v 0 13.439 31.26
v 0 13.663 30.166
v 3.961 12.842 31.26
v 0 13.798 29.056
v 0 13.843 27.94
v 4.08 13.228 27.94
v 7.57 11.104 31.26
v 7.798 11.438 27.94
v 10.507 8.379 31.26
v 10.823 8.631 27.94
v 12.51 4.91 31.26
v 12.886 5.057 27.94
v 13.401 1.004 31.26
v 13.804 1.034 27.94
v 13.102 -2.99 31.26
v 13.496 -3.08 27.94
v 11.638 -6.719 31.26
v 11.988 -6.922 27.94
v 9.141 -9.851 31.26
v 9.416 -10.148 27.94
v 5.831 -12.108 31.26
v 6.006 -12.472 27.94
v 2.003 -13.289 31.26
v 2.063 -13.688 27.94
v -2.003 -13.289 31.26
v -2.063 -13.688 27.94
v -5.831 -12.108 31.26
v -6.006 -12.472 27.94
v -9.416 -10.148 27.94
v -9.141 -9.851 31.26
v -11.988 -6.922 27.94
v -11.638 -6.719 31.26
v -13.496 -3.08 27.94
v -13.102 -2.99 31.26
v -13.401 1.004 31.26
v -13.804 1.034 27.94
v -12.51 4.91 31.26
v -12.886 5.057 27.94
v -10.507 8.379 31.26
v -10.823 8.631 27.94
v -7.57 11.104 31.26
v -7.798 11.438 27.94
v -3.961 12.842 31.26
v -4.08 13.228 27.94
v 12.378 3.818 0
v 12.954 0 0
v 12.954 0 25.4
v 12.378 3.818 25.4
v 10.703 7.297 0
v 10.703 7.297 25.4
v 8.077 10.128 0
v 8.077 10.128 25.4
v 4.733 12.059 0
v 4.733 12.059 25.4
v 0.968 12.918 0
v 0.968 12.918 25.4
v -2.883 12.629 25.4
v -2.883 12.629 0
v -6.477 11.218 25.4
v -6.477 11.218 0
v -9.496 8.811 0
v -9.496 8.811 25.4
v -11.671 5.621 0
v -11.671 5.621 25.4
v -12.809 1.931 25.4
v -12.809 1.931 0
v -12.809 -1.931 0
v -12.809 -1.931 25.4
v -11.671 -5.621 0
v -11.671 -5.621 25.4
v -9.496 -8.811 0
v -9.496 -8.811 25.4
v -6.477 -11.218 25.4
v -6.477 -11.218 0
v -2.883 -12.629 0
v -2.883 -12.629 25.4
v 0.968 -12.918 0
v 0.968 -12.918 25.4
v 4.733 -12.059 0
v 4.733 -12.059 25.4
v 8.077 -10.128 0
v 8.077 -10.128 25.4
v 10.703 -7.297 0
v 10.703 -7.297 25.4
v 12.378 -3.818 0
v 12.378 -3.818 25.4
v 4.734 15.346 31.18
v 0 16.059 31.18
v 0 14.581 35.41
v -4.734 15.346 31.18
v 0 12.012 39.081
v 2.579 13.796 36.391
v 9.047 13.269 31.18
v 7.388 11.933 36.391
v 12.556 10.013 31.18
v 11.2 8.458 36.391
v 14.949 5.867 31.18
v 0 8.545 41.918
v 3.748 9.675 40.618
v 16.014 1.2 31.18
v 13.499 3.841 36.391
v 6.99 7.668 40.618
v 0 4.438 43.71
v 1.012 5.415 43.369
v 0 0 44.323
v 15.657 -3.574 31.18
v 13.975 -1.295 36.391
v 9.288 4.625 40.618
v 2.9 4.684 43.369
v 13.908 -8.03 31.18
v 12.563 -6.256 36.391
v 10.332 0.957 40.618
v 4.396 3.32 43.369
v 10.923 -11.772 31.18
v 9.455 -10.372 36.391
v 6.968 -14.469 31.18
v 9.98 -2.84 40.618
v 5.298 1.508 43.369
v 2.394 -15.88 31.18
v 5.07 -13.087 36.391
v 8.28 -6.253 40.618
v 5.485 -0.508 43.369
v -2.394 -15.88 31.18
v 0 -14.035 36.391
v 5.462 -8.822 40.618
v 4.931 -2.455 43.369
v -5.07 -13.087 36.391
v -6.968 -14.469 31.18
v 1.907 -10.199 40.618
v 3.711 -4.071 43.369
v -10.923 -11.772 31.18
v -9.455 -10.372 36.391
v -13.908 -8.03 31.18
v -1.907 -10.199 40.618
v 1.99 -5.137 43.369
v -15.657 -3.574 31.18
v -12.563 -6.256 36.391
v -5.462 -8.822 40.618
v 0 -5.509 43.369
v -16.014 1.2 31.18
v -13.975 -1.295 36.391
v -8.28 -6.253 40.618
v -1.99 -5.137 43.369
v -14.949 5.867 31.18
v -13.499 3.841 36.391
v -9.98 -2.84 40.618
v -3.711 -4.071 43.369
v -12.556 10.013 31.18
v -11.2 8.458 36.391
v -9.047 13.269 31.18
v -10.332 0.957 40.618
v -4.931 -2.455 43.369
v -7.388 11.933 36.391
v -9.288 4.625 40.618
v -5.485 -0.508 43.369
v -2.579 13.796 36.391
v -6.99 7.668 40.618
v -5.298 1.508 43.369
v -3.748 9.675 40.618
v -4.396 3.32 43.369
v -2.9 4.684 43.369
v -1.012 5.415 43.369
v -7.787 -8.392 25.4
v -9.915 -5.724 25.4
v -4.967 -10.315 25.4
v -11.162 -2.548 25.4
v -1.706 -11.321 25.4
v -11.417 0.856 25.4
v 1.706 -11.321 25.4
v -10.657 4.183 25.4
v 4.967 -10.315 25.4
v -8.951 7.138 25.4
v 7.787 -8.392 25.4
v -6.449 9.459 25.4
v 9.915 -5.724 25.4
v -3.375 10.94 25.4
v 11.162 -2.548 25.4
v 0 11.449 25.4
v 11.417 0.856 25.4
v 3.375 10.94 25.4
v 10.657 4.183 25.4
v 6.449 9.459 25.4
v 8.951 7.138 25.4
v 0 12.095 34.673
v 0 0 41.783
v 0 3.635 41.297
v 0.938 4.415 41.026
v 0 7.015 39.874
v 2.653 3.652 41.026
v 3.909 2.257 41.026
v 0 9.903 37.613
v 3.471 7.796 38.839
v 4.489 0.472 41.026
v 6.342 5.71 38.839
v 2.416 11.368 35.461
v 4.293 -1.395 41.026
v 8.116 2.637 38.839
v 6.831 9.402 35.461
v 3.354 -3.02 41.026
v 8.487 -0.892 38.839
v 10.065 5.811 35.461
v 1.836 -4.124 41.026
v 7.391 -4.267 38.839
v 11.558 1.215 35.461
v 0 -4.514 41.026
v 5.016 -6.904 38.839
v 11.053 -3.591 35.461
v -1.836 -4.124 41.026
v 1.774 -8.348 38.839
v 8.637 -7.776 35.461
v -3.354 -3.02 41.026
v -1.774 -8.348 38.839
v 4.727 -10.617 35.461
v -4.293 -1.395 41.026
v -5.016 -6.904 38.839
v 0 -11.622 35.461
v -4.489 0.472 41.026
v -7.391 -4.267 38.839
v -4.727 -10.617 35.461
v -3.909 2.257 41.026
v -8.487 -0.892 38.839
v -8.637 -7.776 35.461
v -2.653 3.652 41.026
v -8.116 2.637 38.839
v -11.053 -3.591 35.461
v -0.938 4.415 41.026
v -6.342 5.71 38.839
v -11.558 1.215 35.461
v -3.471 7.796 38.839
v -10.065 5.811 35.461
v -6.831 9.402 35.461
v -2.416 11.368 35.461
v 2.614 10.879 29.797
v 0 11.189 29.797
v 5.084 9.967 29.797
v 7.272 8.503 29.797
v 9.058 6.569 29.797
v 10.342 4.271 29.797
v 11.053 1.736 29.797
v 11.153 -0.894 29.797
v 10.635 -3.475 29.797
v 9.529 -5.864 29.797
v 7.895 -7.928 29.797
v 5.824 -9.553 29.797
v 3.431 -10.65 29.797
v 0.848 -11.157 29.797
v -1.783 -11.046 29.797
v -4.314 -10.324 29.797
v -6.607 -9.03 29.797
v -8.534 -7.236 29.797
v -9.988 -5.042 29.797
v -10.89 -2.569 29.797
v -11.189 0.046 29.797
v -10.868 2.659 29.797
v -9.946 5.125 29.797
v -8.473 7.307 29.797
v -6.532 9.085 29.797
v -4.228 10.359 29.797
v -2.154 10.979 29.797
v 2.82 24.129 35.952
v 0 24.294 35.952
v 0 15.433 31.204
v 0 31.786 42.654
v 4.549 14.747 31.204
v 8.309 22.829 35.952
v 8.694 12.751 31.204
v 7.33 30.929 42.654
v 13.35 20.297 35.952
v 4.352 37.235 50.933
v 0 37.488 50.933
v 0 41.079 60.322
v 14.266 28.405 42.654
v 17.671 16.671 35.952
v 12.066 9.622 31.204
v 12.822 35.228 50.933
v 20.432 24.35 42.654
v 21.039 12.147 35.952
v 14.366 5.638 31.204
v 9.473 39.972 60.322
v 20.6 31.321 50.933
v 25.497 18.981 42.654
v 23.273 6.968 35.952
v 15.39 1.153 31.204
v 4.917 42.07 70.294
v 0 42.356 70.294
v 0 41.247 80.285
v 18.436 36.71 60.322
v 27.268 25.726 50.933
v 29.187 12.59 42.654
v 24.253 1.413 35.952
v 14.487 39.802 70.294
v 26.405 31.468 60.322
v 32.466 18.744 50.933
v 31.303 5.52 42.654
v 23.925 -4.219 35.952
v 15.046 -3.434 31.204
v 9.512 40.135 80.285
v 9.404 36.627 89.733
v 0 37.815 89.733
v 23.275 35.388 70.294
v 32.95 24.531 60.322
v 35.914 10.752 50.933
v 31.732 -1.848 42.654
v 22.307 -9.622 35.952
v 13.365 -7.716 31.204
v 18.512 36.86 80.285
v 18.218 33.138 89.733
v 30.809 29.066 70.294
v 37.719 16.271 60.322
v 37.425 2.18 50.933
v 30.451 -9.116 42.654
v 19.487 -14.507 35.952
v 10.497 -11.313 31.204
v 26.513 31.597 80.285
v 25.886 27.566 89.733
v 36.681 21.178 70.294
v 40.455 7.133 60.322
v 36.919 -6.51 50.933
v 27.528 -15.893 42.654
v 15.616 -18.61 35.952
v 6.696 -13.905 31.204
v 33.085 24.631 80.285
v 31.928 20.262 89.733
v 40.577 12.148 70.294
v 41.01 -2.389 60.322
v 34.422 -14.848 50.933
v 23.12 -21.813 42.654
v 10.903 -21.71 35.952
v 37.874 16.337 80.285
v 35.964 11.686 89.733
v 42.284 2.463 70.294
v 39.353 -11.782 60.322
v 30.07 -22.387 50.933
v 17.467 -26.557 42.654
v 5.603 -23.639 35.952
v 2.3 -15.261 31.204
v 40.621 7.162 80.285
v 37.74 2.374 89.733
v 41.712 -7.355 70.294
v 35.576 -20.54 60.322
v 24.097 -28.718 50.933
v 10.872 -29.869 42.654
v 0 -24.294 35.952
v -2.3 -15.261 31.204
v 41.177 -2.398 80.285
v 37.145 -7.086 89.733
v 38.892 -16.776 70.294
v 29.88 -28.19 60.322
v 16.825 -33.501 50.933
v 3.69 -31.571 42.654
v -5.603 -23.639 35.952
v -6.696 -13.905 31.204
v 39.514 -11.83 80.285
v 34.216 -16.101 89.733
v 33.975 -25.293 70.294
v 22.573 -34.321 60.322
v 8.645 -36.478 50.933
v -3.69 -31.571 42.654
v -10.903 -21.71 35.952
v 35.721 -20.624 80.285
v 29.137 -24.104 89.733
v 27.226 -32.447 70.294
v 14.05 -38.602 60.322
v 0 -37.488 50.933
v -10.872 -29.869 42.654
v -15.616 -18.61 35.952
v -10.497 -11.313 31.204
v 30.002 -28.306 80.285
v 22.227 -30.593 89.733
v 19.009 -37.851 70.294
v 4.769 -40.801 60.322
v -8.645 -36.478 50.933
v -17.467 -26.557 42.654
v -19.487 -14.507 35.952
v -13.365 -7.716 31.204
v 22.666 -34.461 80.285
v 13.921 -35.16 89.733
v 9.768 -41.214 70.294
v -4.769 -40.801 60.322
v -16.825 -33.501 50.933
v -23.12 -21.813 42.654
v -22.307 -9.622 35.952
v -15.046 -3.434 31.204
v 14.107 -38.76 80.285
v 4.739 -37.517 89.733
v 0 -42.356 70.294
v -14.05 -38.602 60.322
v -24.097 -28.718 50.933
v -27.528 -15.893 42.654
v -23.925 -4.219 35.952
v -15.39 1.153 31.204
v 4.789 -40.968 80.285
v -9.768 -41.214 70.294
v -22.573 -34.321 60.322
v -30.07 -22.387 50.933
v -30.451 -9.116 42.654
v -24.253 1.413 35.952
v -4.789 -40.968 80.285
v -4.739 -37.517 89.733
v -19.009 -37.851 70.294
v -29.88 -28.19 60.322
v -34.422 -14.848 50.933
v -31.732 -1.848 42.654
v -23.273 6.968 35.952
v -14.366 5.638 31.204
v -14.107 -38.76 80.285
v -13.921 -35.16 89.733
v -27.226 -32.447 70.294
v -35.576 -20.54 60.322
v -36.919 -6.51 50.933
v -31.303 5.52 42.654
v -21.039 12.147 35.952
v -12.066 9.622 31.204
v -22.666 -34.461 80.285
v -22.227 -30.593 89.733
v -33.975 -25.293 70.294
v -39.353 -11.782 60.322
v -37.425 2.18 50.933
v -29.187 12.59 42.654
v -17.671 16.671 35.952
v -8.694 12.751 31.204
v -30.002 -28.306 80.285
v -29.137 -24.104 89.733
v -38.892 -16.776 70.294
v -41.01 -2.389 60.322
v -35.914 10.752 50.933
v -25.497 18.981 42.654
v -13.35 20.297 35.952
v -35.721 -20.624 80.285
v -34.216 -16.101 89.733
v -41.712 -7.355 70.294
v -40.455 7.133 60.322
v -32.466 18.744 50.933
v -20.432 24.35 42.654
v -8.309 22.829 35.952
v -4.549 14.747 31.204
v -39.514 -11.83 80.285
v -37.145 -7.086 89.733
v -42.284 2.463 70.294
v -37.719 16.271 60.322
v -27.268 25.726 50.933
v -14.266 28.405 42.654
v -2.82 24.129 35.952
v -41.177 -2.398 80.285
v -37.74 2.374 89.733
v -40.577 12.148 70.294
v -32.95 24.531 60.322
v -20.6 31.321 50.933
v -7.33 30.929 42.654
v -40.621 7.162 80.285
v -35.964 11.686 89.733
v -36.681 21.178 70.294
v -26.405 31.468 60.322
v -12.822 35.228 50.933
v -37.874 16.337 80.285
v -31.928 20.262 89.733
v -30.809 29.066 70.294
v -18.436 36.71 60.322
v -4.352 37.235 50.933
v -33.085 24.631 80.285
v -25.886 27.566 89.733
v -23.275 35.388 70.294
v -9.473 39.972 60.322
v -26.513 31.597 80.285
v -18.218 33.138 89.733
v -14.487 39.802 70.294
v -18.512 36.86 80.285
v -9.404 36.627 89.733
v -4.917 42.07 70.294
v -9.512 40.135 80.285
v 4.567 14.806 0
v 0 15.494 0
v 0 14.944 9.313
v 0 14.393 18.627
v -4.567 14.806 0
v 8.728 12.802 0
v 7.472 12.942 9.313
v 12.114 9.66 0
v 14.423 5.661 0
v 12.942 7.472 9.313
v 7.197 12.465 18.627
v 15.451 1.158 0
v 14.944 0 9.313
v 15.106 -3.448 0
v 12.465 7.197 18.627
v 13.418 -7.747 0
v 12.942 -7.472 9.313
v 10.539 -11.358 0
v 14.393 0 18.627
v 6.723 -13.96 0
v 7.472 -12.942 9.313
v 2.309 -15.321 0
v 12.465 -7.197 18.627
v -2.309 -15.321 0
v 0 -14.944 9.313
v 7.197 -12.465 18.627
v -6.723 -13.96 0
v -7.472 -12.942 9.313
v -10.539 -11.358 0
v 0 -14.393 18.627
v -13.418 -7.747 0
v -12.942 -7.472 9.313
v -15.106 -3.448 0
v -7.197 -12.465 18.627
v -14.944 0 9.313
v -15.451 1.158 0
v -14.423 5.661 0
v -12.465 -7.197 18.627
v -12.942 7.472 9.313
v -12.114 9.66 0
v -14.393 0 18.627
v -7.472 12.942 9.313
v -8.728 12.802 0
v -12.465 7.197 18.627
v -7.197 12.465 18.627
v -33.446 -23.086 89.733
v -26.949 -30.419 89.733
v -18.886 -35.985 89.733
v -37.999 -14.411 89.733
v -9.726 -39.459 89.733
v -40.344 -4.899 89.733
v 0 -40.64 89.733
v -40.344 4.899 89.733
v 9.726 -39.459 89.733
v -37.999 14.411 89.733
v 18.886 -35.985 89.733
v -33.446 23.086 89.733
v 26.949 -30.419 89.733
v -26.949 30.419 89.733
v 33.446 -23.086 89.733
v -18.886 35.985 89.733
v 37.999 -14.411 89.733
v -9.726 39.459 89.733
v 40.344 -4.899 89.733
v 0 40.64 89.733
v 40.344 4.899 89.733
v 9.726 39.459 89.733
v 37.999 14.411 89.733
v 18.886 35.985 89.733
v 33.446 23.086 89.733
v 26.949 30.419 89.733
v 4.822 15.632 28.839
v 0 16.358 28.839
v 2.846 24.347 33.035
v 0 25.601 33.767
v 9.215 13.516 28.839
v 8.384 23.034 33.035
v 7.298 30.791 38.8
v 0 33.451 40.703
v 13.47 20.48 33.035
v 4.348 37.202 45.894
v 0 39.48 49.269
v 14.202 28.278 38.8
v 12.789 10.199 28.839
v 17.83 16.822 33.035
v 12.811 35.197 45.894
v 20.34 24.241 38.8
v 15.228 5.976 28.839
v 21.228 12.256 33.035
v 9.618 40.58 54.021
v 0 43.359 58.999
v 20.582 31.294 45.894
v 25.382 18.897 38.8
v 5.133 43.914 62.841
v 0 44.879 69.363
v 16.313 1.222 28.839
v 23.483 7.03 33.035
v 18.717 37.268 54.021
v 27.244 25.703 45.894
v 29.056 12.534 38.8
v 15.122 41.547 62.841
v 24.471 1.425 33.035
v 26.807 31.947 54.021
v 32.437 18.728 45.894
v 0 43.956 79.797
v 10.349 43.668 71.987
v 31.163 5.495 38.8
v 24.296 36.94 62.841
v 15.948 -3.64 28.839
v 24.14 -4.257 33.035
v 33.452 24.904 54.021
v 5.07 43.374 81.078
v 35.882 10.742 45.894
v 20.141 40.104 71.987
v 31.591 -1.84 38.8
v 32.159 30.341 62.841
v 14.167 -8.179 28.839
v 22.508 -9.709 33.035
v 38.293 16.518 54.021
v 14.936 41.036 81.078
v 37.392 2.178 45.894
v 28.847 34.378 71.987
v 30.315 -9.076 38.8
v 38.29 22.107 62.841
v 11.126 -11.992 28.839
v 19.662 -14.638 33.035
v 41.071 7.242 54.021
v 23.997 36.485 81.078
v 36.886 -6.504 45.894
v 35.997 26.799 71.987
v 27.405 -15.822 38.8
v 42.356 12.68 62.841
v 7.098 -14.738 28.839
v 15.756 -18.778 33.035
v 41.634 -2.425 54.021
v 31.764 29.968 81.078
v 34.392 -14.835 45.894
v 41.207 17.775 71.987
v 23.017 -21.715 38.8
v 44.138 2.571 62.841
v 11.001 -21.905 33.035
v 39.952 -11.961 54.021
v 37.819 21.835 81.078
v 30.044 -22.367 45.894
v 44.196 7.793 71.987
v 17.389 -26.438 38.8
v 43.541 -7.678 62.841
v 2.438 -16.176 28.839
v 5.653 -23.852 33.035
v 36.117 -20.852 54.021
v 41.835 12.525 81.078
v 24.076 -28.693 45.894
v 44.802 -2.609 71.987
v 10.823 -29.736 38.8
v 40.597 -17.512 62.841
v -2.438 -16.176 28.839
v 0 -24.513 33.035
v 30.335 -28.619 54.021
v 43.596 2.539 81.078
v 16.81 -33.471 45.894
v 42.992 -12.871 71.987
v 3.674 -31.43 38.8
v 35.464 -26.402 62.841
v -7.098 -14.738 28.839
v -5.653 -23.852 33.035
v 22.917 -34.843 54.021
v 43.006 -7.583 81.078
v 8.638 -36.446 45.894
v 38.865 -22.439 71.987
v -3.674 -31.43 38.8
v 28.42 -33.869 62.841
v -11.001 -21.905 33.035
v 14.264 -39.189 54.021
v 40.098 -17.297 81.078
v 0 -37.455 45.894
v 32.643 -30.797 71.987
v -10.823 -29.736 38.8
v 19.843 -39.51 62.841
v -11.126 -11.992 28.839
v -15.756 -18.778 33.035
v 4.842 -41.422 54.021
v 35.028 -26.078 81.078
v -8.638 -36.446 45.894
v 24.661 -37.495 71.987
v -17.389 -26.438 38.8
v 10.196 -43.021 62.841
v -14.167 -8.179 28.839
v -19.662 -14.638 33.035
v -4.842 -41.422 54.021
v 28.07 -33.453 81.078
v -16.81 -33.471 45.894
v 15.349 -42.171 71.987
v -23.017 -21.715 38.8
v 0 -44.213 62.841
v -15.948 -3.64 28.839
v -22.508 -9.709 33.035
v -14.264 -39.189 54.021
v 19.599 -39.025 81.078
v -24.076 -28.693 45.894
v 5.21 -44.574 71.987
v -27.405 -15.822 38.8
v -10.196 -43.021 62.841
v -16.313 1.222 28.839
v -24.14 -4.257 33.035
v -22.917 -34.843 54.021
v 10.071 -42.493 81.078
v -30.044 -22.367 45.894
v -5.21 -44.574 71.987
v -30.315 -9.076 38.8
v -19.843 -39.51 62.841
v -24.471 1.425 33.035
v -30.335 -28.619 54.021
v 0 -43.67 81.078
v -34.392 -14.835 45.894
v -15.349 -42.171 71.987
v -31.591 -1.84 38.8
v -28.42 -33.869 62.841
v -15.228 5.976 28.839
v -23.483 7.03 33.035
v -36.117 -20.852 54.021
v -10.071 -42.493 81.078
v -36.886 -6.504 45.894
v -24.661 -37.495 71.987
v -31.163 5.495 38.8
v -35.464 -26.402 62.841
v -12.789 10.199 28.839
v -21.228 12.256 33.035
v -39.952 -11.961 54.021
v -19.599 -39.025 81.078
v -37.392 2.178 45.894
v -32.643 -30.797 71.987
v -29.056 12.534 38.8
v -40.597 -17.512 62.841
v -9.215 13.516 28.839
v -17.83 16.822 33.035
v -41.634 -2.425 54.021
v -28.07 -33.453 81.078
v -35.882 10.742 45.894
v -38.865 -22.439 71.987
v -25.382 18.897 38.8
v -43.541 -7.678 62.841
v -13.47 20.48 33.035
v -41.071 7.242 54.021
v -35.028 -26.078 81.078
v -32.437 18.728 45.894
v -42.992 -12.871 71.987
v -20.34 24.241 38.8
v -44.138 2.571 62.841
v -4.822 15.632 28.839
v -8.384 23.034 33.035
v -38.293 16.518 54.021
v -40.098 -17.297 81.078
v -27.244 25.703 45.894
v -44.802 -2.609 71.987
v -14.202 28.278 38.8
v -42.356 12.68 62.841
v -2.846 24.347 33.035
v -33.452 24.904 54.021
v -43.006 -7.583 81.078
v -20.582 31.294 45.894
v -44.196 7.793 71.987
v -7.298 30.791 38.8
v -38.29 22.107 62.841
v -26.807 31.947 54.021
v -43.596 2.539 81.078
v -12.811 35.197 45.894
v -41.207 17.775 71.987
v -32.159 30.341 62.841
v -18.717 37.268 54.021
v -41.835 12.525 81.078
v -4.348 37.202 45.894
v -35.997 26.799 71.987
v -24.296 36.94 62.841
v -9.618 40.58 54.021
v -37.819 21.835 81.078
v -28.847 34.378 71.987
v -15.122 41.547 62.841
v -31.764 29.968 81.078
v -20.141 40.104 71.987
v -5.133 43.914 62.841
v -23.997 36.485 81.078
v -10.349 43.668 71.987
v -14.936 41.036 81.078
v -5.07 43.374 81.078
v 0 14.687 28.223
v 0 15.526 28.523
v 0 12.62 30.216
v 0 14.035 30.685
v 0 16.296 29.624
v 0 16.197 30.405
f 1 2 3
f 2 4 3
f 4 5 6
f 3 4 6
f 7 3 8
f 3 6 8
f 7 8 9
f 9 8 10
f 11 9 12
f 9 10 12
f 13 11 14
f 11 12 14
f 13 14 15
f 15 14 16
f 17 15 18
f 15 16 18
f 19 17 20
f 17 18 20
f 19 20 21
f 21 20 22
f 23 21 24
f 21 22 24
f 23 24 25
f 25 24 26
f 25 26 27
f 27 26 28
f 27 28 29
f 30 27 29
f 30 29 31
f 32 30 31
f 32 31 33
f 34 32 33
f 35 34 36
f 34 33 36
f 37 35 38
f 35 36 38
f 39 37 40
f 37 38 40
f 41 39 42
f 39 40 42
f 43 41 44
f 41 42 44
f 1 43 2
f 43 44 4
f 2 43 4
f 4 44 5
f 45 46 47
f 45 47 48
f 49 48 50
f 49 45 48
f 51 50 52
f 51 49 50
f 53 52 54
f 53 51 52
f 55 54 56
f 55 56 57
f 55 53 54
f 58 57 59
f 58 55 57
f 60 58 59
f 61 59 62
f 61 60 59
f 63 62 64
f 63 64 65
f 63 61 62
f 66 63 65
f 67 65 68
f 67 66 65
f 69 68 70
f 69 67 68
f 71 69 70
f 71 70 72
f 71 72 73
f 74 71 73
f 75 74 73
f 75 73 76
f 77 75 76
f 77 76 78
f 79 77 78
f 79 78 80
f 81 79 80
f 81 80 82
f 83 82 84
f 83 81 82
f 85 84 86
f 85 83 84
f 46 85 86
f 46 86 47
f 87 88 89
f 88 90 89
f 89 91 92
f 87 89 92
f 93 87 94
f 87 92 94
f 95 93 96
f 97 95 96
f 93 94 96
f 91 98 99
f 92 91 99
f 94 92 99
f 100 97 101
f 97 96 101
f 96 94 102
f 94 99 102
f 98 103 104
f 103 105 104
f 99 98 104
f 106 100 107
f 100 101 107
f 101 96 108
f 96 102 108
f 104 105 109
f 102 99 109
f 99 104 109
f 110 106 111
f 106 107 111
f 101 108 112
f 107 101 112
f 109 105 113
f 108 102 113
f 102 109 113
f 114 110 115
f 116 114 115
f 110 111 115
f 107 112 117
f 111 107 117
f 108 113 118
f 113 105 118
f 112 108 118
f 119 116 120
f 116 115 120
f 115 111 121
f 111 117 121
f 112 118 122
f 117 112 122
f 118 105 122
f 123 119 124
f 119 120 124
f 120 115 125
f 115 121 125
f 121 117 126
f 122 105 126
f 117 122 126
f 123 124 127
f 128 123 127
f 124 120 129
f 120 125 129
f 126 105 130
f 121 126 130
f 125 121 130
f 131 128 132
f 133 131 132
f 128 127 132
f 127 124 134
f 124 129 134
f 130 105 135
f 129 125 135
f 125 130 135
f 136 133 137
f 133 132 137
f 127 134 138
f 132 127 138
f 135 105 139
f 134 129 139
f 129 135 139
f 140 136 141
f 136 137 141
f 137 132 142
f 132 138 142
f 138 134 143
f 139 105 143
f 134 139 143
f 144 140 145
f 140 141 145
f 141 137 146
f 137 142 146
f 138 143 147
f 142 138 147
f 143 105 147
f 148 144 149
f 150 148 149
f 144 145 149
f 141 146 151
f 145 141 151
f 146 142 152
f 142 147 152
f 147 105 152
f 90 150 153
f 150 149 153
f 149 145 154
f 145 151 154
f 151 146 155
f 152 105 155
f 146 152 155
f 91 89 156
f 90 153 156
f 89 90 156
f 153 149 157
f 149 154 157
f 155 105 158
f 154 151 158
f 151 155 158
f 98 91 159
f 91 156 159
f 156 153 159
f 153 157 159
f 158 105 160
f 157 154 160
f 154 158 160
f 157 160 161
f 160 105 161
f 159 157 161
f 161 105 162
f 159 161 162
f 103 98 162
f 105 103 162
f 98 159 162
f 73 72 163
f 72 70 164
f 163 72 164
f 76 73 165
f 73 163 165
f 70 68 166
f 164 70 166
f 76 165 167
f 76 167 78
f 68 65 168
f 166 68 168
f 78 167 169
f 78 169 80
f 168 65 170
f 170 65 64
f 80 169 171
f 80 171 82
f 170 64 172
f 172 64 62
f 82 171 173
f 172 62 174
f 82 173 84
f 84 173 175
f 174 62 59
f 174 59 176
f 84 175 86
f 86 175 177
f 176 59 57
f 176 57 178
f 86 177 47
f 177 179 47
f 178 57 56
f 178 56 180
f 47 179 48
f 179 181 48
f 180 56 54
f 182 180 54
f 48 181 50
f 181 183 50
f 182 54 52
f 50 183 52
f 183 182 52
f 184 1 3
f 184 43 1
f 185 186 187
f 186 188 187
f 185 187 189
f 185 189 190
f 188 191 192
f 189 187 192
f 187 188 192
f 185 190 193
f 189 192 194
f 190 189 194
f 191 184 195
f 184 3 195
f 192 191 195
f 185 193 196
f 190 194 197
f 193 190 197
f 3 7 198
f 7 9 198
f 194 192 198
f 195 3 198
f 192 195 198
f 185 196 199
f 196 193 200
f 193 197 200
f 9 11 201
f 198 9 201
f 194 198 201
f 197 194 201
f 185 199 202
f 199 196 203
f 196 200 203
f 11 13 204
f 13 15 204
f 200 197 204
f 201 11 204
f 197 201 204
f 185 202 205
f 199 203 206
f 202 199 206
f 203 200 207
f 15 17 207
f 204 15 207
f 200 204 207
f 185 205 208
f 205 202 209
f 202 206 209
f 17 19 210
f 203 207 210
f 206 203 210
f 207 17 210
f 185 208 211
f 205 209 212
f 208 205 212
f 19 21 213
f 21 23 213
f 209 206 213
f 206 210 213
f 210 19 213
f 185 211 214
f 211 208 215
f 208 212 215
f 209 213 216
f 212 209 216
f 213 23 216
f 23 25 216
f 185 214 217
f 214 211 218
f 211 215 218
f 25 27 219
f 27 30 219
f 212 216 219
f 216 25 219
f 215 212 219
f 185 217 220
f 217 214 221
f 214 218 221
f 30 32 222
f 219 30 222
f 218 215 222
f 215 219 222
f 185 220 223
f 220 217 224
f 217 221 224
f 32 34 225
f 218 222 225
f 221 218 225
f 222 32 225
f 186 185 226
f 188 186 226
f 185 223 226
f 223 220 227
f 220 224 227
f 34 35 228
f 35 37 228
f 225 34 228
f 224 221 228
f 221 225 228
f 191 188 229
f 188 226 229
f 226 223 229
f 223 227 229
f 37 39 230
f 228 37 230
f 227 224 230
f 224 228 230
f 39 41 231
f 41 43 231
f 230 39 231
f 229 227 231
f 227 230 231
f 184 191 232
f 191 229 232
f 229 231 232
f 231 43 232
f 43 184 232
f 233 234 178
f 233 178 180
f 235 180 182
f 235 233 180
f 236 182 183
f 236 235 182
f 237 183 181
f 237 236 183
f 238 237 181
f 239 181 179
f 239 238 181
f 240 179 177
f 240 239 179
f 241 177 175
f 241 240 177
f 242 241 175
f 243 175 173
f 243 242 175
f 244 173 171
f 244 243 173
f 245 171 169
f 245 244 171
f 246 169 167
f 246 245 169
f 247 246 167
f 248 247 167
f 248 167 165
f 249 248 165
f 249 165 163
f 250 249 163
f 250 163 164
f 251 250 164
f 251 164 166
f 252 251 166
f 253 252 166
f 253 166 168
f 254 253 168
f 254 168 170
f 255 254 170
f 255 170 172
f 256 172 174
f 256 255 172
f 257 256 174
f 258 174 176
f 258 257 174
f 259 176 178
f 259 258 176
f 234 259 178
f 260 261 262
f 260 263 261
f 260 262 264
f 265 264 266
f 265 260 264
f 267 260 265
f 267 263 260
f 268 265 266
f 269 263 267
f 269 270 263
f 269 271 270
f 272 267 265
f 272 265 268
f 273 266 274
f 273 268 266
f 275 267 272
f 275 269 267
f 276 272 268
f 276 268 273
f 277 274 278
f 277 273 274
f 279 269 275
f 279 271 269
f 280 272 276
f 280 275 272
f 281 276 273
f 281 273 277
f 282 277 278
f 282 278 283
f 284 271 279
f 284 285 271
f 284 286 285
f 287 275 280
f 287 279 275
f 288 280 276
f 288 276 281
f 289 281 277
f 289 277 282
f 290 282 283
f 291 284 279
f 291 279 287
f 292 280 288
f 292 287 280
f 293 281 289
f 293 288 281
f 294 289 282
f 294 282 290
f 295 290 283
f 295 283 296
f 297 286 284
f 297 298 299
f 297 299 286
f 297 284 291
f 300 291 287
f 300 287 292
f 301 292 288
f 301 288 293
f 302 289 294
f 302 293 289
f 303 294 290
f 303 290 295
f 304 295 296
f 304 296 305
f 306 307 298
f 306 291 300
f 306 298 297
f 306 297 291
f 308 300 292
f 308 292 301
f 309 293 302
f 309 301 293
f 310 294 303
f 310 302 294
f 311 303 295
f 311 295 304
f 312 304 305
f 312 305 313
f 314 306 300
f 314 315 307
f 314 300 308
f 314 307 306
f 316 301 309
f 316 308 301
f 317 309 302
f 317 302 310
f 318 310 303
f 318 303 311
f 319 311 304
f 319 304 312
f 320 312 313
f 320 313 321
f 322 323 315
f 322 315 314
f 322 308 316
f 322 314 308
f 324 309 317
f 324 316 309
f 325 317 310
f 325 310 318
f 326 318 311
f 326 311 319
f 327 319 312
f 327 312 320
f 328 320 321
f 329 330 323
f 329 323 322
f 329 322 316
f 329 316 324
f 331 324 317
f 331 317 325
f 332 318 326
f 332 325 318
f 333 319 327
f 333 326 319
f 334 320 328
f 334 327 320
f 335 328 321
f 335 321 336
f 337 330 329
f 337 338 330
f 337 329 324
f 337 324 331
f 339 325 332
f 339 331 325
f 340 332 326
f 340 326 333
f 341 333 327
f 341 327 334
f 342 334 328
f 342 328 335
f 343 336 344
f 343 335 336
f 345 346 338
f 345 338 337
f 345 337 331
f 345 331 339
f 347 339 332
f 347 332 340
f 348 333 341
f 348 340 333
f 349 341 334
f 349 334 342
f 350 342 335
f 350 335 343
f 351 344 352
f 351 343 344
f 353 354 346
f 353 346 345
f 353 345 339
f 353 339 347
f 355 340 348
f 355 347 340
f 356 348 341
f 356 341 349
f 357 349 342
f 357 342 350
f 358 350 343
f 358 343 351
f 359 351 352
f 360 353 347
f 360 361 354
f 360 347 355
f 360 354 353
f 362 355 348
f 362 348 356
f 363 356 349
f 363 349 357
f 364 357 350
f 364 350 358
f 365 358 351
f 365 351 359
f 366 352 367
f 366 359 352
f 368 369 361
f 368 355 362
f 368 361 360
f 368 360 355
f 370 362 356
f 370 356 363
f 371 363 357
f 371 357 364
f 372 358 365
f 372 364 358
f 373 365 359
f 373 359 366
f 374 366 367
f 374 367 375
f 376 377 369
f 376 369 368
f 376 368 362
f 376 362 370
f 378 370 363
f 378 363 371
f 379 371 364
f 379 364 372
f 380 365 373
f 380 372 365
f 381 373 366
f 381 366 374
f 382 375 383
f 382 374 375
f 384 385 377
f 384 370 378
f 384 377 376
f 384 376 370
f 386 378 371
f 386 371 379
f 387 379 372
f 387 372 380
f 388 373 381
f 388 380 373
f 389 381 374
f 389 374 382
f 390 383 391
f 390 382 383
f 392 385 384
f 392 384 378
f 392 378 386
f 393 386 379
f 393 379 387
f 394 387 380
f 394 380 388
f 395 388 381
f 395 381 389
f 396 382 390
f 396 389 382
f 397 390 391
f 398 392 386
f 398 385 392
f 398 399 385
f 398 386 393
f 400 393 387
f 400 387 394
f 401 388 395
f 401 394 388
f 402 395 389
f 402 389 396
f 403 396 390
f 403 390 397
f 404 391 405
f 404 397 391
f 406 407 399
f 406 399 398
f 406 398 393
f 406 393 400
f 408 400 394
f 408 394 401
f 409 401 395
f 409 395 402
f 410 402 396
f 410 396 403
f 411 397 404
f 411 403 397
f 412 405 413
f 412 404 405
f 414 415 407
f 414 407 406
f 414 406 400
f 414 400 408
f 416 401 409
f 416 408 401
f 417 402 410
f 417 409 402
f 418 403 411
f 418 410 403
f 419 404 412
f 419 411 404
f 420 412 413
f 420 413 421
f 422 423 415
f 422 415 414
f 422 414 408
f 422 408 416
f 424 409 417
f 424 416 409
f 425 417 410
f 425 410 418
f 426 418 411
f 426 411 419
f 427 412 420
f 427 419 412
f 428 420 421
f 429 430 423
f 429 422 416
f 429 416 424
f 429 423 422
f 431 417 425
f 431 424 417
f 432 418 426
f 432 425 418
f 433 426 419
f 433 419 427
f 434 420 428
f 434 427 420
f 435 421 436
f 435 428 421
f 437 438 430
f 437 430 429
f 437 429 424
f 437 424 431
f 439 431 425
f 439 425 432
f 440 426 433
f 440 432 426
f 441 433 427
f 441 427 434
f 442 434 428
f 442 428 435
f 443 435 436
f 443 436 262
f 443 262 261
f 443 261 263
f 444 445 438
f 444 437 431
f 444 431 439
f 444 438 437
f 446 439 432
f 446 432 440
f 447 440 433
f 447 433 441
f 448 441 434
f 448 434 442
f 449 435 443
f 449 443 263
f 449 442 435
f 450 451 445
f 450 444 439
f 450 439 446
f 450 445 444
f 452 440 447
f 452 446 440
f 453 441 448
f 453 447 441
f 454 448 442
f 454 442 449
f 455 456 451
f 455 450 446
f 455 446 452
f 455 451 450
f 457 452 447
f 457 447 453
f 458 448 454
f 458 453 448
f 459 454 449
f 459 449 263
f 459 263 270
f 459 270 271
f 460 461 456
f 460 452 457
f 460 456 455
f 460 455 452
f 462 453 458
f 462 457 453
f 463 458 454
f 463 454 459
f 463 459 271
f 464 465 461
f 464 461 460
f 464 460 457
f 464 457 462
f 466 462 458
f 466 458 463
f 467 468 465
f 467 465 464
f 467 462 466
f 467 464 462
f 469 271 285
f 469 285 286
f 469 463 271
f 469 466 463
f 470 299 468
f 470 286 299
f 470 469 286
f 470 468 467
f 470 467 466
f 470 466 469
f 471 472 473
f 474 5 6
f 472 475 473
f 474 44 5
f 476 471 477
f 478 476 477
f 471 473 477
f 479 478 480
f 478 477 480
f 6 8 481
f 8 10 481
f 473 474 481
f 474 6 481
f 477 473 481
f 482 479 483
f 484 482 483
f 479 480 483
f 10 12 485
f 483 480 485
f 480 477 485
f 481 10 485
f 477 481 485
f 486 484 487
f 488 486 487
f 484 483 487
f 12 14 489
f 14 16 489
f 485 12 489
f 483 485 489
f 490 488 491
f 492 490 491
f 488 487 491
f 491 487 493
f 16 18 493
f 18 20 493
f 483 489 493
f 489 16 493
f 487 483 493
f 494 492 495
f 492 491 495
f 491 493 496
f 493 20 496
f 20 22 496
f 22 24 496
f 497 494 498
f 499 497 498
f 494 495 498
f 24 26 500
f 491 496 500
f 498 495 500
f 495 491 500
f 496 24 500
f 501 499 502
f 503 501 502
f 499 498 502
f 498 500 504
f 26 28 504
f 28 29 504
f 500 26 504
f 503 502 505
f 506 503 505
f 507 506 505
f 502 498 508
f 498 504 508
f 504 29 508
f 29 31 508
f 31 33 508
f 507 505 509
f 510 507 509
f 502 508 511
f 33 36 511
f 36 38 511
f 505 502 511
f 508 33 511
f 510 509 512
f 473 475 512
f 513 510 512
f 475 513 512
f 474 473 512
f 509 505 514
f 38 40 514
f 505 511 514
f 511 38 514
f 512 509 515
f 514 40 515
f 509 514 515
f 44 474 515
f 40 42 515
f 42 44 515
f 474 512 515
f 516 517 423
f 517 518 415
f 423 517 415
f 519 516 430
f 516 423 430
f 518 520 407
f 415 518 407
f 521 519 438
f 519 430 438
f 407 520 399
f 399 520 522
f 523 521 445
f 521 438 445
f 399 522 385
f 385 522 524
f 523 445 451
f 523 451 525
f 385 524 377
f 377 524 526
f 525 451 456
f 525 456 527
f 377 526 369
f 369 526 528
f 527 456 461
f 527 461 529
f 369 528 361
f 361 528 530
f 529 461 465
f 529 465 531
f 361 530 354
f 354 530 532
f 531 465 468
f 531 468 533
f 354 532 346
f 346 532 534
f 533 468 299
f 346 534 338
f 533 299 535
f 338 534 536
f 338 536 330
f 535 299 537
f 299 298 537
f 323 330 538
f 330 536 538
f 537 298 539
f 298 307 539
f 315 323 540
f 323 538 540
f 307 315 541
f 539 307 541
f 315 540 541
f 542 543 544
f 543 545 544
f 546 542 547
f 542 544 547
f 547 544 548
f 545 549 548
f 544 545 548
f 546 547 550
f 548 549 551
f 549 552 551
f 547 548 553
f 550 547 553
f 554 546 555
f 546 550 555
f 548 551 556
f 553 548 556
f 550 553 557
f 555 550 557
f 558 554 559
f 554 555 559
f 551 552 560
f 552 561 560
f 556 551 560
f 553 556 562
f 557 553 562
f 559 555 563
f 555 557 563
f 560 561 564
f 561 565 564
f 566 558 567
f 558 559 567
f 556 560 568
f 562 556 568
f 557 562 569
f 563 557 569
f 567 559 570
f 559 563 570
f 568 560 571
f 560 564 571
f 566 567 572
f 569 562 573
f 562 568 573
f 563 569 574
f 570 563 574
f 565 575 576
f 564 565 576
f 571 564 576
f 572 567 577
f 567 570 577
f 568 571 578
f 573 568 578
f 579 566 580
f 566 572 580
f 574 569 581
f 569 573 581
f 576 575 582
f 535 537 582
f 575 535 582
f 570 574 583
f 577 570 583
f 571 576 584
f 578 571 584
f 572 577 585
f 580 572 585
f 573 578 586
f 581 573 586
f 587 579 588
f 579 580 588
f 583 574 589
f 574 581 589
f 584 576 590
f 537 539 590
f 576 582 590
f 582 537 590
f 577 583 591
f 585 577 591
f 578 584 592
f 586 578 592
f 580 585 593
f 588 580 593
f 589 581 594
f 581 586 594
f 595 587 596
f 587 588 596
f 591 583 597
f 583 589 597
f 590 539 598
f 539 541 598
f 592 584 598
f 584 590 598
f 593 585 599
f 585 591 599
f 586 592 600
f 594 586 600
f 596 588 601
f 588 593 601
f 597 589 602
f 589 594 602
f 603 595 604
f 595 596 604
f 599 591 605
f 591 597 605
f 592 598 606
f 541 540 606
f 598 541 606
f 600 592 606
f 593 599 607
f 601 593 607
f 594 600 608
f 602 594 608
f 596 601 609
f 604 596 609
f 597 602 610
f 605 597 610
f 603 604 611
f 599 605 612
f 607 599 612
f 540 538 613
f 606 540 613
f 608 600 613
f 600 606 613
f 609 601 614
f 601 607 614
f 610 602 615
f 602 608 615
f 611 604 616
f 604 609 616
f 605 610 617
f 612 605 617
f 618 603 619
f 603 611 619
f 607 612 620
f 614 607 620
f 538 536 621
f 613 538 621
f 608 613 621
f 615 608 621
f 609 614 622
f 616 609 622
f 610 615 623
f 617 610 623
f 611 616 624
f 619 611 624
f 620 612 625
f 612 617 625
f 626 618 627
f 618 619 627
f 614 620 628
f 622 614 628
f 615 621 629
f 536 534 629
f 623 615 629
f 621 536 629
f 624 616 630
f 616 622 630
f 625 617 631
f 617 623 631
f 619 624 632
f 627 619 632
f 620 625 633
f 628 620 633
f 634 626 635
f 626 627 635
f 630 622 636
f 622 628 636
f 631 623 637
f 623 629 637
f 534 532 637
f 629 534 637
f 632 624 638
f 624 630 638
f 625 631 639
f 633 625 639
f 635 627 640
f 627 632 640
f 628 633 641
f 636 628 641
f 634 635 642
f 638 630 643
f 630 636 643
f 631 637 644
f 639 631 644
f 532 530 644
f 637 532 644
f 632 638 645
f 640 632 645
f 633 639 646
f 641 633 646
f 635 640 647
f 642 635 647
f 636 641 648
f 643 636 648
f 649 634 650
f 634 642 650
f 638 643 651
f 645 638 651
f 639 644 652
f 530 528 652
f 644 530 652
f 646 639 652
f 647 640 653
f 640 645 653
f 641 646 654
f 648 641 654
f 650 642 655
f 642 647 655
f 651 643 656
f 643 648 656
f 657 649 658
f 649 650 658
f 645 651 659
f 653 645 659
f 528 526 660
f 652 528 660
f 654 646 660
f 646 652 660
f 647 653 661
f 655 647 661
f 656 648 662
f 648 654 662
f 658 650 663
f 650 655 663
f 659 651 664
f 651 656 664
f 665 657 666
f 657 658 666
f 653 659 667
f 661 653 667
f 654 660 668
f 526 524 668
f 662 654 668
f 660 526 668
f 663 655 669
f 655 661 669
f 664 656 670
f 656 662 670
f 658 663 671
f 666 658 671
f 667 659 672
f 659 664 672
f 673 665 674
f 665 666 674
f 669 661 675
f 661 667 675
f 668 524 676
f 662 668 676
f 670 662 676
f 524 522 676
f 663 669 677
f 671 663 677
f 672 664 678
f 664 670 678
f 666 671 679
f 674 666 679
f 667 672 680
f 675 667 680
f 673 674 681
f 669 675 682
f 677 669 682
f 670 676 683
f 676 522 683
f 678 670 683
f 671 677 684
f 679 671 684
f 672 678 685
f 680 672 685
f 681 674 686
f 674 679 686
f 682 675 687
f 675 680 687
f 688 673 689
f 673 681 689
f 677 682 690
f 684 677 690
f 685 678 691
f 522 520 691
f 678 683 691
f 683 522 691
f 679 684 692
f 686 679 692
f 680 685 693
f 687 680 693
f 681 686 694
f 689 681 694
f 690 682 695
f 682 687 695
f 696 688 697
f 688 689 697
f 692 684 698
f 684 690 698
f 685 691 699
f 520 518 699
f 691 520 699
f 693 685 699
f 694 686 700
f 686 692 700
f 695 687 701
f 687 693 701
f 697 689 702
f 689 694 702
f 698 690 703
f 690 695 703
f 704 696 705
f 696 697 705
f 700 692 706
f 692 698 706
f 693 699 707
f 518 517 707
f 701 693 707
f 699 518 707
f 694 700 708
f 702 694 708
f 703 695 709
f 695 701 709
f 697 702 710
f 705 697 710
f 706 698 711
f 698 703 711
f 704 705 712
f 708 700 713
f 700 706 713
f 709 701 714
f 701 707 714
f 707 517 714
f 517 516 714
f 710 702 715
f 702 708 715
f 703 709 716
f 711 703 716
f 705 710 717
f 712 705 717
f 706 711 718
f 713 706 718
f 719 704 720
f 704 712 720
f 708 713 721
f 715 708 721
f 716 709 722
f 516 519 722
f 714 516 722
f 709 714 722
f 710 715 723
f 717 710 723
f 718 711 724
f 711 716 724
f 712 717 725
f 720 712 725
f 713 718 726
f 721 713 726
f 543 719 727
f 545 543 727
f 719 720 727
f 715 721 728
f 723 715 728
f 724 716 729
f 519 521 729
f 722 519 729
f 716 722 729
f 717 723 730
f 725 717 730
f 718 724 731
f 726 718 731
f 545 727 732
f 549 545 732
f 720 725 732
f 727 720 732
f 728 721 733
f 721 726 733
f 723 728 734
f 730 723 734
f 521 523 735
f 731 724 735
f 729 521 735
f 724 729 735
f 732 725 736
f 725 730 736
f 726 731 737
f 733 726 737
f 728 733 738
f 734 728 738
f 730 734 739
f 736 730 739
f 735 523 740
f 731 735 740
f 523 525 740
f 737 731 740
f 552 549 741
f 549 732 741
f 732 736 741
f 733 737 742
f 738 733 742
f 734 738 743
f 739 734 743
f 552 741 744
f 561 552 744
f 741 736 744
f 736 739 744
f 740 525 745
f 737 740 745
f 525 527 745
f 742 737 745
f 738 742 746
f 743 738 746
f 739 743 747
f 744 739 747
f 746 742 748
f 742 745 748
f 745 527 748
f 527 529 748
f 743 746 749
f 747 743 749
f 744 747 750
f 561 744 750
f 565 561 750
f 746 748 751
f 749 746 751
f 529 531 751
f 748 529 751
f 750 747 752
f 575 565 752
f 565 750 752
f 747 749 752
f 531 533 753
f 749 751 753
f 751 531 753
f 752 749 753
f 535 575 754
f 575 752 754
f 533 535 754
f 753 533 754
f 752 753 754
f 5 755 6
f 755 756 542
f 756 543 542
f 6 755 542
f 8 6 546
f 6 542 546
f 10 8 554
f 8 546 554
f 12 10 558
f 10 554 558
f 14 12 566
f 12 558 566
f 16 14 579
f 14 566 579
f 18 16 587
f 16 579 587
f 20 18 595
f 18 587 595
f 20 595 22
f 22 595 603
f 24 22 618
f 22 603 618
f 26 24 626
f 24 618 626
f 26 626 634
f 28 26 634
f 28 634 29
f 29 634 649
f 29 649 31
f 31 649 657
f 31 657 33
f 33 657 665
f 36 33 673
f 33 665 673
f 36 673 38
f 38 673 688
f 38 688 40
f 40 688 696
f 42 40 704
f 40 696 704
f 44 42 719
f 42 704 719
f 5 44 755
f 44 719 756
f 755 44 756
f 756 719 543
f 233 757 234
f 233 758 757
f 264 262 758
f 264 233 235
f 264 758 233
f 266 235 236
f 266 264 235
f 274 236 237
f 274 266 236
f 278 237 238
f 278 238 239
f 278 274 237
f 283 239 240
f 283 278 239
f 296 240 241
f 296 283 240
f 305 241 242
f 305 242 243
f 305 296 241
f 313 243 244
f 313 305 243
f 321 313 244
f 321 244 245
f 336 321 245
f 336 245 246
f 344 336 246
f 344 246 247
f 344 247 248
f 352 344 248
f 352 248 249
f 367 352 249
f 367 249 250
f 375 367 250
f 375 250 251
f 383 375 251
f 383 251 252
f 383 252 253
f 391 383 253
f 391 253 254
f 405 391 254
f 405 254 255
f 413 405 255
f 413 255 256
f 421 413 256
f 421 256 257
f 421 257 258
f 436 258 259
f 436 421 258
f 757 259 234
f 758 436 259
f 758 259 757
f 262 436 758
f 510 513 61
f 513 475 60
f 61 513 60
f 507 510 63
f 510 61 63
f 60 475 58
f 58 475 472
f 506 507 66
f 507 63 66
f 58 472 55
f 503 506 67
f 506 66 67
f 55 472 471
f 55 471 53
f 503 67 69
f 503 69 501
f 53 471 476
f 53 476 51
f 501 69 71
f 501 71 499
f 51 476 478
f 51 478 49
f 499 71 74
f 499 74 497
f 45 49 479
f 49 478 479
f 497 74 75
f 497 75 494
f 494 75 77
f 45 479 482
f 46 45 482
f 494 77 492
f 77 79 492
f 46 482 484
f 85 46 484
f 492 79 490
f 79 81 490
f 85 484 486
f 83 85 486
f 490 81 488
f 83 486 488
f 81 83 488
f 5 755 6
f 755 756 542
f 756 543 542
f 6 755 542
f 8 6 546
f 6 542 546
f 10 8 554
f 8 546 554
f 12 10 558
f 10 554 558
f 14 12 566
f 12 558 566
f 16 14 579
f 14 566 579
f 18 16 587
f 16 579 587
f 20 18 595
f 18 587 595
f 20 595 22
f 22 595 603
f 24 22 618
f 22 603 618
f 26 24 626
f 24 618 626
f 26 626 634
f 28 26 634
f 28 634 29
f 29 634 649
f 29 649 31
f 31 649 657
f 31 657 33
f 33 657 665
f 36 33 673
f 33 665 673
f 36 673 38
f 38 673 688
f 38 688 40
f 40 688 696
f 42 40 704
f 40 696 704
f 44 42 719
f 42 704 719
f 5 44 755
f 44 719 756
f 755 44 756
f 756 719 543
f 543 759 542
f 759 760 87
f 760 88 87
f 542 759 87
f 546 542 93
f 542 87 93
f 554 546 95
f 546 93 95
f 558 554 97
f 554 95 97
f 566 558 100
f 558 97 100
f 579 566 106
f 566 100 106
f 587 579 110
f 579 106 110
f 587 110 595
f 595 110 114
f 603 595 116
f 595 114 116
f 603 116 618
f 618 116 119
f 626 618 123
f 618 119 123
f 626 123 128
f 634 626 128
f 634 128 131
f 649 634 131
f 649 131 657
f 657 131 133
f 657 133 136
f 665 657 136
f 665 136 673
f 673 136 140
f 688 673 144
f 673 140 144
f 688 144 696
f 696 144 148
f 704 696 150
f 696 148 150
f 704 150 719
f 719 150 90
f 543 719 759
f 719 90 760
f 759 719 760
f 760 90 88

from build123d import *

# Parameters (mm, degrees)
F2_T     = -2.54
F3_R     = 12.954
F4_DEPTH = 25.4


with BuildPart() as f1:
    # F0 (on Right) → F1 (revolve)
    with BuildSketch(Plane.YZ):
        with BuildLine():
            Line((0, 41.783), (0, 0))
            Line((0, 0), (12.9495693602, 0))
            Line((12.9495693602, 0), (11.2833142379, 28.198163607))
            ThreePointArc((11.2833142379, 28.198163607), (11.8260483136, 30.1059090312), (13.4388892092, 31.2603773616))
            ThreePointArc((13.4388892092, 31.2603773616), (8.5341861118, 38.8393722942), (0, 41.783))
        make_face()
        with BuildLine():
            Line((11.2833142379, 28.198163607), (12.9495693602, 0))
            Line((12.9495693602, 0), (15.494, 0))
            Line((15.494, 0), (13.843, 27.94))
            ThreePointArc((13.843, 27.94), (13.7416009315, 29.6124391883), (13.4388892092, 31.2603773616))
            ThreePointArc((13.4388892092, 31.2603773616), (11.8260483136, 30.1059090312), (11.2833142379, 28.198163607))
        make_face()
        with BuildLine():
            Line((0, 44.323), (0, 41.783))
            ThreePointArc((0, 41.783), (8.5341861118, 38.8393722942), (13.4388892092, 31.2603773616))
            ThreePointArc((13.4388892092, 31.2603773616), (13.7416009315, 29.6124391883), (13.843, 27.94))
            ThreePointArc((13.843, 27.94), (15.1073491741, 28.3706806758), (16.3583276121, 28.838780693))
            ThreePointArc((16.3583276121, 28.838780693), (16.2510823708, 30.0148519891), (16.0593950001, 31.180142162))
            ThreePointArc((16.0593950001, 31.180142162), (10.3759201992, 40.6184450553), (0, 44.323))
        make_face()
        with BuildLine():
            Line((0, 89.7334072543), (0, 44.323))
            ThreePointArc((0, 44.323), (10.3759201992, 40.6184450553), (16.0593950001, 31.180142162))
            ThreePointArc((16.0593950001, 31.180142162), (39.8802110067, 55.6384087033), (38.1, 89.7334072543))
            Line((38.1, 89.7334072543), (0, 89.7334072543))
        make_face()
        with BuildLine():
            ThreePointArc((38.1, 89.7334072543), (39.8802110067, 55.6384087033), (16.0593950001, 31.180142162))
            ThreePointArc((16.0593950001, 31.180142162), (16.2510823708, 30.0148519891), (16.3583276121, 28.838780693))
            ThreePointArc((16.3583276121, 28.838780693), (41.7042111022, 54.0205943653), (40.64, 89.7334072543))
            Line((40.64, 89.7334072543), (38.1, 89.7334072543))
        make_face()
    revolve(axis=Axis((0, 0, 44.8667036272), (0, 0, -1)))

    # F2
    f2_openings = [f1.faces().sort_by_distance(p)[0] for p in [
        (0, 0, 89.733407),
    ]]
    offset(amount=F2_T, openings=f2_openings, kind=Kind.INTERSECTION)

    # F3 (on Top) → F4 (cut)
    with BuildSketch(Plane.XY):
        Circle(F3_R)
    extrude(amount=F4_DEPTH, mode=Mode.SUBTRACT)


with BuildPart() as f5:
    # F0 (on Right) → F5 (revolve)
    with BuildSketch(Plane.YZ):
        with BuildLine():
            Line((0, 44.323), (0, 41.783))
            ThreePointArc((0, 41.783), (8.5341861118, 38.8393722942), (13.4388892092, 31.2603773616))
            ThreePointArc((13.4388892092, 31.2603773616), (13.7416009315, 29.6124391883), (13.843, 27.94))
            ThreePointArc((13.843, 27.94), (15.1073491741, 28.3706806758), (16.3583276121, 28.838780693))
            ThreePointArc((16.3583276121, 28.838780693), (16.2510823708, 30.0148519891), (16.0593950001, 31.180142162))
            ThreePointArc((16.0593950001, 31.180142162), (10.3759201992, 40.6184450553), (0, 44.323))
        make_face()
    revolve(axis=Axis((0, 0, 44.8667036272), (0, 0, -1)))


solid = Compound([f1.part, f5.part])
